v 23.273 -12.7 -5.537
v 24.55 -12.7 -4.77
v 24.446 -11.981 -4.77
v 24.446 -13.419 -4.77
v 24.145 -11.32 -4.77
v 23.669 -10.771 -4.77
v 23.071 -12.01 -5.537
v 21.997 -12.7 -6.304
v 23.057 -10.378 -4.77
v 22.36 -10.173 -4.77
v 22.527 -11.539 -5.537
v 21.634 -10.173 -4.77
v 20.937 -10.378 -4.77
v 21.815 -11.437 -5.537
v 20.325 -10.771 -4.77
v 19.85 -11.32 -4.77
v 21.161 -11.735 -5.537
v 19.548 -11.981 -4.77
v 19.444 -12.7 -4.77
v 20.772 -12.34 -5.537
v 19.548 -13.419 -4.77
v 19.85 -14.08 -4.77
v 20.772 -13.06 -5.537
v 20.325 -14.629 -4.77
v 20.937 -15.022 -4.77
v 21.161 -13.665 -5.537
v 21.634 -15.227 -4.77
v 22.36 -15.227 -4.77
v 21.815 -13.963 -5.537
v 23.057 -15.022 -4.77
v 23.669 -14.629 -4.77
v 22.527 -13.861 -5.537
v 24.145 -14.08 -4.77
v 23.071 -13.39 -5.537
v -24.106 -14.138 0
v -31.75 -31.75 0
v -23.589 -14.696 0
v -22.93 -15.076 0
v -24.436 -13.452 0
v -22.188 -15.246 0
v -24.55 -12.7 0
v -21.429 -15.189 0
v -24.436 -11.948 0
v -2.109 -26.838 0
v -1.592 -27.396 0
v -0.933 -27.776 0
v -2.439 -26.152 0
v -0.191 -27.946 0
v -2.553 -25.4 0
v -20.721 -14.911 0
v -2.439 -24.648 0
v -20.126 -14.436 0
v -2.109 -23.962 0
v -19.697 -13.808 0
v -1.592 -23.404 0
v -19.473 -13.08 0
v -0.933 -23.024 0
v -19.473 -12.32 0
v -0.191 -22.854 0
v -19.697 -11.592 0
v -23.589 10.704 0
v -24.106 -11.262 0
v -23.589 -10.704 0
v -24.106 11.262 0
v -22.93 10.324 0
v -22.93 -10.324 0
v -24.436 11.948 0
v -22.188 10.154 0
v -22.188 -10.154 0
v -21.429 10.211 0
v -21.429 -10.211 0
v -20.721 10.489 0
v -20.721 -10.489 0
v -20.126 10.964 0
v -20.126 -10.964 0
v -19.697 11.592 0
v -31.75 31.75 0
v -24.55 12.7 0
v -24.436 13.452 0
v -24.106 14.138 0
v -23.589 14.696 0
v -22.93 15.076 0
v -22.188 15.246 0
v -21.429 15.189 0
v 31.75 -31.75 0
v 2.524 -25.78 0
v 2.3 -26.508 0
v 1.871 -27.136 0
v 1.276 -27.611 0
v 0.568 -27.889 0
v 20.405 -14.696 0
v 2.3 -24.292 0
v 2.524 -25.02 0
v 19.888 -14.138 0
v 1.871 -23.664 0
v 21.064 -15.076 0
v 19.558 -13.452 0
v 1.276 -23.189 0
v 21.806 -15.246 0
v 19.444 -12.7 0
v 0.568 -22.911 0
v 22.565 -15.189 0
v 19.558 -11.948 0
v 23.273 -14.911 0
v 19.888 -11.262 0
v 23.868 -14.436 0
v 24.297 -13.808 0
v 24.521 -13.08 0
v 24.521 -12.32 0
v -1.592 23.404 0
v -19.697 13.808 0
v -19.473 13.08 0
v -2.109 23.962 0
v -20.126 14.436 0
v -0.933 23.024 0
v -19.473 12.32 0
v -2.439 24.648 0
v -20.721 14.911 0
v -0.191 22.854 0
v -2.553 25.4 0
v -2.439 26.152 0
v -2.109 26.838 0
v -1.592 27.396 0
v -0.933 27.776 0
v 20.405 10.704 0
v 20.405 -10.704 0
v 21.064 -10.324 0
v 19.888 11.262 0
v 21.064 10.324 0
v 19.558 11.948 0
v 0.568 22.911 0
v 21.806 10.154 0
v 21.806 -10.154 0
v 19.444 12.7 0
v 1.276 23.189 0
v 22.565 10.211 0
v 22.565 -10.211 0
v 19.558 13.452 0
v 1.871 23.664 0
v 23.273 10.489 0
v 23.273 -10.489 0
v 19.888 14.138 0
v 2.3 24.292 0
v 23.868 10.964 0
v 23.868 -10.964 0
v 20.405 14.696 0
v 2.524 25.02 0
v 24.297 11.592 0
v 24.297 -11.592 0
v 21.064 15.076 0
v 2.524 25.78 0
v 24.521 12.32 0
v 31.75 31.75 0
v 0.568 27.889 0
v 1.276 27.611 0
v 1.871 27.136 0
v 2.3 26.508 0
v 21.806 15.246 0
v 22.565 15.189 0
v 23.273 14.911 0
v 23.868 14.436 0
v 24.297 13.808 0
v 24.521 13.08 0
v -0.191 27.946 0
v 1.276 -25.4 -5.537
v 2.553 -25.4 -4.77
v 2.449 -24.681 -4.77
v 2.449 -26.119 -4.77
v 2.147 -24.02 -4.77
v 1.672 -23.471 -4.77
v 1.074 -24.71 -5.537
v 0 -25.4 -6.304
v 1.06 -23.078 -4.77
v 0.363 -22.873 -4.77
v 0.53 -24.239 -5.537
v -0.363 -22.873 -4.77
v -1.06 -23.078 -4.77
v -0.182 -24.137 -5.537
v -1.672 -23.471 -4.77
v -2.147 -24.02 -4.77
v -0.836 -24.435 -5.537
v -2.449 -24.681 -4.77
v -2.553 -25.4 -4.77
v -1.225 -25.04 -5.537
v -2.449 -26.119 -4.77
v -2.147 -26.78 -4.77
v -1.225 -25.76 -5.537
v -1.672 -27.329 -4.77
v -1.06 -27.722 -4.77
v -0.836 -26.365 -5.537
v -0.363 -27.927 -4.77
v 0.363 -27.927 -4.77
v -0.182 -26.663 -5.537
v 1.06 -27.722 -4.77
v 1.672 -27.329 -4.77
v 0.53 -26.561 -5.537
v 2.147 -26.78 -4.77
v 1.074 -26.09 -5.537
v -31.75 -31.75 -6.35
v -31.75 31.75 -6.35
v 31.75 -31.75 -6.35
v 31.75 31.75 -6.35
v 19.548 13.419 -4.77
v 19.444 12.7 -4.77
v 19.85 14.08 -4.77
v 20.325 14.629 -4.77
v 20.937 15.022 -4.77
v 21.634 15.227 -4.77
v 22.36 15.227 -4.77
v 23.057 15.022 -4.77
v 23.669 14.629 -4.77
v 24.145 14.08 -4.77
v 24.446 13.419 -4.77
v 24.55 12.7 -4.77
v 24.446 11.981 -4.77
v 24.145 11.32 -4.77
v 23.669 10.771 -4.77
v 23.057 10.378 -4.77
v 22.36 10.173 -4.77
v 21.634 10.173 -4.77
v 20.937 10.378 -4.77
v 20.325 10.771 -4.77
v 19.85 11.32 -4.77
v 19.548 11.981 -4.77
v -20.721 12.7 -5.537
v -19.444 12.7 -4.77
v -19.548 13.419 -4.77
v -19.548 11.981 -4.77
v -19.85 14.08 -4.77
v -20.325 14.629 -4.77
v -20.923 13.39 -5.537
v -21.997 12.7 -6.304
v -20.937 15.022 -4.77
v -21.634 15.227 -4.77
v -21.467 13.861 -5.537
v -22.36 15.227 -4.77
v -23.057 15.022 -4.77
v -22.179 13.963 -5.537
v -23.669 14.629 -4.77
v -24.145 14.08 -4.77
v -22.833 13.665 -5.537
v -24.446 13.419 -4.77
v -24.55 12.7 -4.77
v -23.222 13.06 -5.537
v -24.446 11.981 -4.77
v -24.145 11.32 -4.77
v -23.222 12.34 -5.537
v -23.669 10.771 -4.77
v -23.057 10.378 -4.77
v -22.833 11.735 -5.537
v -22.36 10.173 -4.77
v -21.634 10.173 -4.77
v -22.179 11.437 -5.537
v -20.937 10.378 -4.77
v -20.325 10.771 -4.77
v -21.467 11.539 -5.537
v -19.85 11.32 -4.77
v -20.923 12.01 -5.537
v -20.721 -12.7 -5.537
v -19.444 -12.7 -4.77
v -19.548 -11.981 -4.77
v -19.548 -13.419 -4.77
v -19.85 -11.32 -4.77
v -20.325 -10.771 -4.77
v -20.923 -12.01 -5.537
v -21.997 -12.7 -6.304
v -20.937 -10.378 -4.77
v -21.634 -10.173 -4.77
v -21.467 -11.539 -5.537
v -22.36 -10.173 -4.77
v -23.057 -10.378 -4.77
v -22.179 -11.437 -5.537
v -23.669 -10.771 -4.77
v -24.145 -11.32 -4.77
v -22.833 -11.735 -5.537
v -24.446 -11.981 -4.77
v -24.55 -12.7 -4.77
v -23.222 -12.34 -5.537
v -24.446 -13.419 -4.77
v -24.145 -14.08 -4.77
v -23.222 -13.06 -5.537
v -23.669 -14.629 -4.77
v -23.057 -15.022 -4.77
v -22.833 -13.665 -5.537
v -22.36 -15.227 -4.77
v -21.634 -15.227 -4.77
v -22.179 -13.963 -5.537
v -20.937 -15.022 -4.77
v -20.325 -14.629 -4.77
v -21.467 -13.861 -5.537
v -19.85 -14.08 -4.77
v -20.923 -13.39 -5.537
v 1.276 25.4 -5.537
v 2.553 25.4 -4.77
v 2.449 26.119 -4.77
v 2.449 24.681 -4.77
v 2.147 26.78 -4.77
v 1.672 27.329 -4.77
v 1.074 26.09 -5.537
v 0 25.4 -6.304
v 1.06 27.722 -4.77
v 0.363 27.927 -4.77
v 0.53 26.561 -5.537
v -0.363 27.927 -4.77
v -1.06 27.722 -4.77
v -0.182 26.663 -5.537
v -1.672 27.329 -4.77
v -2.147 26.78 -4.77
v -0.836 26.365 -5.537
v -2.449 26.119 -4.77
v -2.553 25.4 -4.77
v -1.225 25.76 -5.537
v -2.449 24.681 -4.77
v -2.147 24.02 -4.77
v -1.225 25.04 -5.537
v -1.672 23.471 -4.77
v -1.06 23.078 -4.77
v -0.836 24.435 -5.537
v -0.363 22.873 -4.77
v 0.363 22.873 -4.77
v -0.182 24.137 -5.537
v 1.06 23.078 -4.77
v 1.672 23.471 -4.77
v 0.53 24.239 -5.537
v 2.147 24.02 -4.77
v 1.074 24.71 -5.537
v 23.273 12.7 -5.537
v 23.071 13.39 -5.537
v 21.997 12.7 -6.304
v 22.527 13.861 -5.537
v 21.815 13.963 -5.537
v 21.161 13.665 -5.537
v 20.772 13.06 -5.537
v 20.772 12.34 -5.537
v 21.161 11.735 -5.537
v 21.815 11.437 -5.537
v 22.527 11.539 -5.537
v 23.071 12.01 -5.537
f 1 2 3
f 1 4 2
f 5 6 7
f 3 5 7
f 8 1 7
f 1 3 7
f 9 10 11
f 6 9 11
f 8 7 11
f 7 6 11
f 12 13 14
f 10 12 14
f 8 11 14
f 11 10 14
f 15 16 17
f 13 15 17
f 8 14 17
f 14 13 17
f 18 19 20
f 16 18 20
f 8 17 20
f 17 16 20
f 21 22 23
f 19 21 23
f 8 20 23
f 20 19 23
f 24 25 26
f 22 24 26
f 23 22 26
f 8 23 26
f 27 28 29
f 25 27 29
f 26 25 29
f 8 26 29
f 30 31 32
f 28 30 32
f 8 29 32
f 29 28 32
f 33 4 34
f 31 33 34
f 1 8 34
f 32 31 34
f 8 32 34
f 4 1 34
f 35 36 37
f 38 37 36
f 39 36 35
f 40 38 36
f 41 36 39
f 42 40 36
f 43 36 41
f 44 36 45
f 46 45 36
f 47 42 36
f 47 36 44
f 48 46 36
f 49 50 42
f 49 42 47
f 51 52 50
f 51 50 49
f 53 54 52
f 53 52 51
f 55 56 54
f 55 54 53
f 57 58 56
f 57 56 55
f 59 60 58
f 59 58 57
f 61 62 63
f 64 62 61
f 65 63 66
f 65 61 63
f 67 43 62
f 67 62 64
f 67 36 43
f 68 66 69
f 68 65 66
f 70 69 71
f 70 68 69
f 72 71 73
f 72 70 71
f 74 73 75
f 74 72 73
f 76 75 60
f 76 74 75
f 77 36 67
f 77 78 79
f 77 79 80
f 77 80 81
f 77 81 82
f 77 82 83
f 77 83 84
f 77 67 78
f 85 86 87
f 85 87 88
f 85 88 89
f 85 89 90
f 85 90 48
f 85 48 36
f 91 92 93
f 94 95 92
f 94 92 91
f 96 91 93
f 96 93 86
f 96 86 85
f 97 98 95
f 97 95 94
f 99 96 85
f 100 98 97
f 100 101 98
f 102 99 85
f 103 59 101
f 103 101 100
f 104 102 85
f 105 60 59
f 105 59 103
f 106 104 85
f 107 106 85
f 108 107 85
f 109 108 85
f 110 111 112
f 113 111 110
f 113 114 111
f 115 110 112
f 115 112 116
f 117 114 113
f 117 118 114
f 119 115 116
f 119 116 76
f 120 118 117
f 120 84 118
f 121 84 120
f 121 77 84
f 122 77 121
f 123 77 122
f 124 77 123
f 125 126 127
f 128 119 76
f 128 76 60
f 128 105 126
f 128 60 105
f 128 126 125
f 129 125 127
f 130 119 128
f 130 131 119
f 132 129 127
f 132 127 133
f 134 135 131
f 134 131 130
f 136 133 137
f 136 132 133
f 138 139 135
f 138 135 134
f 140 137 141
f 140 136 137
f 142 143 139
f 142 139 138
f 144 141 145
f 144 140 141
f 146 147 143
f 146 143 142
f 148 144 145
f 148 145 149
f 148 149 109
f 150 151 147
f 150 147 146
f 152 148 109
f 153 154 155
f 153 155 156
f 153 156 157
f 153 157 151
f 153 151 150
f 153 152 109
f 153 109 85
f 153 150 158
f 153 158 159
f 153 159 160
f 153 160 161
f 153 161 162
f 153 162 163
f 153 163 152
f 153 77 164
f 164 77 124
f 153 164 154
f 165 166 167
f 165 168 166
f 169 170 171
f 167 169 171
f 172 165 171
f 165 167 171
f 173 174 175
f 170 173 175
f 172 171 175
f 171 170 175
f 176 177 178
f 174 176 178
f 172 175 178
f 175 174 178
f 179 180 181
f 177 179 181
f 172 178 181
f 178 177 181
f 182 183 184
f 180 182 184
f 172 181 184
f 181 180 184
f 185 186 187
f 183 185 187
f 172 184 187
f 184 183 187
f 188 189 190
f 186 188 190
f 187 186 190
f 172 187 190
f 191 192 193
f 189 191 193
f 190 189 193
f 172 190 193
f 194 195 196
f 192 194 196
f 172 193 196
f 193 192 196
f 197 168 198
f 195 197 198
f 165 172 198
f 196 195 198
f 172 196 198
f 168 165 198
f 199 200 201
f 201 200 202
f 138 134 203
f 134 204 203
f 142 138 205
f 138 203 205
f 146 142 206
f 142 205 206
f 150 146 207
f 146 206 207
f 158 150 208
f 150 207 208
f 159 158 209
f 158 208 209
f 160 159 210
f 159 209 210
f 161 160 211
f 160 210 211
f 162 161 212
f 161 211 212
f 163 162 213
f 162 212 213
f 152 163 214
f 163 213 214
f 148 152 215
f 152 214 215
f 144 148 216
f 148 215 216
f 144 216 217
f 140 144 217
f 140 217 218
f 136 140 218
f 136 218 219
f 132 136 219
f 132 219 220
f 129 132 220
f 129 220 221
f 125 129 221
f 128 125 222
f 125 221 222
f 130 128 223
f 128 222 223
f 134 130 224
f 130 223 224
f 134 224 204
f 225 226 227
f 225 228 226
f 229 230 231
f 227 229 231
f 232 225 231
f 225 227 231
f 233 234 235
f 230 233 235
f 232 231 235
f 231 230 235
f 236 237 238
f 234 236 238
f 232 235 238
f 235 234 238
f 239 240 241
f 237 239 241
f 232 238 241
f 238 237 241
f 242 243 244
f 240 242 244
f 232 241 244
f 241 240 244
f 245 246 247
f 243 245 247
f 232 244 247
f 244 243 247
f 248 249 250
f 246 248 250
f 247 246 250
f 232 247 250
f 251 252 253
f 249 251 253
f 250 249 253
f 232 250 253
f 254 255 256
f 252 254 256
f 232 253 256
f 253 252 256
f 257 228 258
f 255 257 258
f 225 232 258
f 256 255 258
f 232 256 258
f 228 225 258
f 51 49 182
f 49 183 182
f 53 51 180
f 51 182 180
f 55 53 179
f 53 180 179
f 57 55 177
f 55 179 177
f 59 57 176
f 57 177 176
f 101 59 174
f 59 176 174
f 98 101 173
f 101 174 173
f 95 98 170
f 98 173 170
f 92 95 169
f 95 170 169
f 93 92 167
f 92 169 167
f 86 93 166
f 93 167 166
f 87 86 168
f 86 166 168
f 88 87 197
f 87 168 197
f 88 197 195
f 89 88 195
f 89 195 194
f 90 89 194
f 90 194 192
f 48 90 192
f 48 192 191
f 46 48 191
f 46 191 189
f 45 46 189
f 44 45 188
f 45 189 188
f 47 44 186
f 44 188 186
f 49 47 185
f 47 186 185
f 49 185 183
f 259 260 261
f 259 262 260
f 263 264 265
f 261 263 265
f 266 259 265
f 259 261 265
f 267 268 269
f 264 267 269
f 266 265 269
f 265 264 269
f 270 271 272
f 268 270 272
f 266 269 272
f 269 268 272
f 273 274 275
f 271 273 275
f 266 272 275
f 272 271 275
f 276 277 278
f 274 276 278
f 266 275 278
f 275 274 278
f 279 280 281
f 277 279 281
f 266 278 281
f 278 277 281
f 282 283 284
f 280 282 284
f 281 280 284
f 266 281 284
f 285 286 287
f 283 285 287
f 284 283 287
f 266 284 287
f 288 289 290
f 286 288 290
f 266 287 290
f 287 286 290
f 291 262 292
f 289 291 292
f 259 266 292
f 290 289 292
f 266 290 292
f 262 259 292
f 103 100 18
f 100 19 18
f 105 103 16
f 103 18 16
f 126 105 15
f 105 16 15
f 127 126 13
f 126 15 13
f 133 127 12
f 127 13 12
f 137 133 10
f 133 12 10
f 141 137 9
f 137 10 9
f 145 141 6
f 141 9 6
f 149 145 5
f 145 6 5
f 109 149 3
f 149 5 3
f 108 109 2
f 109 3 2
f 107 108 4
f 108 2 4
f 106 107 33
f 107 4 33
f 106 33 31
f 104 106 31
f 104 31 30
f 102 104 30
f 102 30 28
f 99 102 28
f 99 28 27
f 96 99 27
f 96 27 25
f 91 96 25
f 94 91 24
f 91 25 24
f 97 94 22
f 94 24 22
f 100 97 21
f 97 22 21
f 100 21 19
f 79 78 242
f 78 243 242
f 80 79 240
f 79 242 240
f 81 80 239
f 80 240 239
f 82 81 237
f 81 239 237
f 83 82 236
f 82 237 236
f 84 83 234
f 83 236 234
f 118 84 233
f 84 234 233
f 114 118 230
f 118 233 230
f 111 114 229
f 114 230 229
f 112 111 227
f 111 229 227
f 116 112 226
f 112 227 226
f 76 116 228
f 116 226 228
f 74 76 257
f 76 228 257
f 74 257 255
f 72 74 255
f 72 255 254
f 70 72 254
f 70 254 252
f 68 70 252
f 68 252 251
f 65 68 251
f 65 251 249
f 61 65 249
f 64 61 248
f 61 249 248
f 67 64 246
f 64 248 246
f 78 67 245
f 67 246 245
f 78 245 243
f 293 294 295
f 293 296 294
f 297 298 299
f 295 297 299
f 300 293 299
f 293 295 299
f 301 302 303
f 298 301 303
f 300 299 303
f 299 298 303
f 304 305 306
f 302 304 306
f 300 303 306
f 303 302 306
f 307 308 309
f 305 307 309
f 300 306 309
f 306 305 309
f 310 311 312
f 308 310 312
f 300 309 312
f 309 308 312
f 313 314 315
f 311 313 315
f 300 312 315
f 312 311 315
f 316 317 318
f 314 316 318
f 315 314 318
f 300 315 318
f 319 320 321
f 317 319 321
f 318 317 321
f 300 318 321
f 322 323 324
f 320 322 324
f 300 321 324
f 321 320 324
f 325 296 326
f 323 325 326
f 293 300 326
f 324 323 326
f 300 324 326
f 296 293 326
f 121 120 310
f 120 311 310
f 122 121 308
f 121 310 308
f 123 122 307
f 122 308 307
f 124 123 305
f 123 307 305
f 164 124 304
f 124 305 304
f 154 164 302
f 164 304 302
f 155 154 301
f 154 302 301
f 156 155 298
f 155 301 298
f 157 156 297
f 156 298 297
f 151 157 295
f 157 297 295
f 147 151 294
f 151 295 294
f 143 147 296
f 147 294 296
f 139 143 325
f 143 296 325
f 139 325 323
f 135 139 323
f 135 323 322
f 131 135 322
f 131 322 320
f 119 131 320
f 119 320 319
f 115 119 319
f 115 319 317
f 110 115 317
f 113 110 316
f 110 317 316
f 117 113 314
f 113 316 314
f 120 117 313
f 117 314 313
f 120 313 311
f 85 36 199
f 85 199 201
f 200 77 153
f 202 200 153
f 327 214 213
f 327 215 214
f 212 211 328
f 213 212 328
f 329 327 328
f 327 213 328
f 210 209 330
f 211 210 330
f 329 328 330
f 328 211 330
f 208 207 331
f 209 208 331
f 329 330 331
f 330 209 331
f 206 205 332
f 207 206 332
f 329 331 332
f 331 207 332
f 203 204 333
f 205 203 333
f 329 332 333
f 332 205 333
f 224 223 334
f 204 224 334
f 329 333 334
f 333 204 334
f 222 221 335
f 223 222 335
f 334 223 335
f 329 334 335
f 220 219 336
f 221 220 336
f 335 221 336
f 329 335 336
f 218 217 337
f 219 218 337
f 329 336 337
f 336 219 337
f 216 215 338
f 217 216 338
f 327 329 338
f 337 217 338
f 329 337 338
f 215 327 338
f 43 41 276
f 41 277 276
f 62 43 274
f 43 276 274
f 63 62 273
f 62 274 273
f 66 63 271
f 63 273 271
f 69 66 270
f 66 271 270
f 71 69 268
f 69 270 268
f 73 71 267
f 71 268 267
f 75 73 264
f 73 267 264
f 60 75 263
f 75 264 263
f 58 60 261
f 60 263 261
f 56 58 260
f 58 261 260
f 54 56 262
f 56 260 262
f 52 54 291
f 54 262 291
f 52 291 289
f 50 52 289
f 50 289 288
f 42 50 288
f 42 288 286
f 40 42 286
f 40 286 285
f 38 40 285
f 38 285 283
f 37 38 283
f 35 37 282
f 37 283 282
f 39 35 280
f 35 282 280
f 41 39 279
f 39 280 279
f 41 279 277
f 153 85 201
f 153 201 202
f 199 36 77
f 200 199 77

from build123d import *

# Parameters (mm, degrees)
F0_W     = 63.5
F0_H     = 63.5
F1_DEPTH = 6.35
F2_D     = 5.1054
F2_DEPTH = 4.77
F2_TIP   = 1.5338169022


# Not quite as in the source:
# - a length typed as a fraction of an inch, garbled in the dataset ("3 / 203.2 mm" for 3/8 in), is restored


with BuildPart() as f1:
    # F0 (on Top) → F1 (new body)
    with BuildSketch(Plane.XY):
        Rectangle(F0_W, F0_H)
    extrude(amount=-F1_DEPTH)

    # F2
    with Locations(Plane.XY):
        with Locations((0, -25.4), (21.9970452561, -12.7), (21.9970452561, 12.7), (0, 25.4), (-21.9970452561, -12.7), (-21.9970452561, 12.7)):
            Hole(F2_D / 2, depth=F2_DEPTH)
            with Locations((0, 0, -(F2_DEPTH + F2_TIP / 2))):  # 118° drill point
                Cone(0, F2_D / 2, F2_TIP, mode=Mode.SUBTRACT)


solid = f1.part
